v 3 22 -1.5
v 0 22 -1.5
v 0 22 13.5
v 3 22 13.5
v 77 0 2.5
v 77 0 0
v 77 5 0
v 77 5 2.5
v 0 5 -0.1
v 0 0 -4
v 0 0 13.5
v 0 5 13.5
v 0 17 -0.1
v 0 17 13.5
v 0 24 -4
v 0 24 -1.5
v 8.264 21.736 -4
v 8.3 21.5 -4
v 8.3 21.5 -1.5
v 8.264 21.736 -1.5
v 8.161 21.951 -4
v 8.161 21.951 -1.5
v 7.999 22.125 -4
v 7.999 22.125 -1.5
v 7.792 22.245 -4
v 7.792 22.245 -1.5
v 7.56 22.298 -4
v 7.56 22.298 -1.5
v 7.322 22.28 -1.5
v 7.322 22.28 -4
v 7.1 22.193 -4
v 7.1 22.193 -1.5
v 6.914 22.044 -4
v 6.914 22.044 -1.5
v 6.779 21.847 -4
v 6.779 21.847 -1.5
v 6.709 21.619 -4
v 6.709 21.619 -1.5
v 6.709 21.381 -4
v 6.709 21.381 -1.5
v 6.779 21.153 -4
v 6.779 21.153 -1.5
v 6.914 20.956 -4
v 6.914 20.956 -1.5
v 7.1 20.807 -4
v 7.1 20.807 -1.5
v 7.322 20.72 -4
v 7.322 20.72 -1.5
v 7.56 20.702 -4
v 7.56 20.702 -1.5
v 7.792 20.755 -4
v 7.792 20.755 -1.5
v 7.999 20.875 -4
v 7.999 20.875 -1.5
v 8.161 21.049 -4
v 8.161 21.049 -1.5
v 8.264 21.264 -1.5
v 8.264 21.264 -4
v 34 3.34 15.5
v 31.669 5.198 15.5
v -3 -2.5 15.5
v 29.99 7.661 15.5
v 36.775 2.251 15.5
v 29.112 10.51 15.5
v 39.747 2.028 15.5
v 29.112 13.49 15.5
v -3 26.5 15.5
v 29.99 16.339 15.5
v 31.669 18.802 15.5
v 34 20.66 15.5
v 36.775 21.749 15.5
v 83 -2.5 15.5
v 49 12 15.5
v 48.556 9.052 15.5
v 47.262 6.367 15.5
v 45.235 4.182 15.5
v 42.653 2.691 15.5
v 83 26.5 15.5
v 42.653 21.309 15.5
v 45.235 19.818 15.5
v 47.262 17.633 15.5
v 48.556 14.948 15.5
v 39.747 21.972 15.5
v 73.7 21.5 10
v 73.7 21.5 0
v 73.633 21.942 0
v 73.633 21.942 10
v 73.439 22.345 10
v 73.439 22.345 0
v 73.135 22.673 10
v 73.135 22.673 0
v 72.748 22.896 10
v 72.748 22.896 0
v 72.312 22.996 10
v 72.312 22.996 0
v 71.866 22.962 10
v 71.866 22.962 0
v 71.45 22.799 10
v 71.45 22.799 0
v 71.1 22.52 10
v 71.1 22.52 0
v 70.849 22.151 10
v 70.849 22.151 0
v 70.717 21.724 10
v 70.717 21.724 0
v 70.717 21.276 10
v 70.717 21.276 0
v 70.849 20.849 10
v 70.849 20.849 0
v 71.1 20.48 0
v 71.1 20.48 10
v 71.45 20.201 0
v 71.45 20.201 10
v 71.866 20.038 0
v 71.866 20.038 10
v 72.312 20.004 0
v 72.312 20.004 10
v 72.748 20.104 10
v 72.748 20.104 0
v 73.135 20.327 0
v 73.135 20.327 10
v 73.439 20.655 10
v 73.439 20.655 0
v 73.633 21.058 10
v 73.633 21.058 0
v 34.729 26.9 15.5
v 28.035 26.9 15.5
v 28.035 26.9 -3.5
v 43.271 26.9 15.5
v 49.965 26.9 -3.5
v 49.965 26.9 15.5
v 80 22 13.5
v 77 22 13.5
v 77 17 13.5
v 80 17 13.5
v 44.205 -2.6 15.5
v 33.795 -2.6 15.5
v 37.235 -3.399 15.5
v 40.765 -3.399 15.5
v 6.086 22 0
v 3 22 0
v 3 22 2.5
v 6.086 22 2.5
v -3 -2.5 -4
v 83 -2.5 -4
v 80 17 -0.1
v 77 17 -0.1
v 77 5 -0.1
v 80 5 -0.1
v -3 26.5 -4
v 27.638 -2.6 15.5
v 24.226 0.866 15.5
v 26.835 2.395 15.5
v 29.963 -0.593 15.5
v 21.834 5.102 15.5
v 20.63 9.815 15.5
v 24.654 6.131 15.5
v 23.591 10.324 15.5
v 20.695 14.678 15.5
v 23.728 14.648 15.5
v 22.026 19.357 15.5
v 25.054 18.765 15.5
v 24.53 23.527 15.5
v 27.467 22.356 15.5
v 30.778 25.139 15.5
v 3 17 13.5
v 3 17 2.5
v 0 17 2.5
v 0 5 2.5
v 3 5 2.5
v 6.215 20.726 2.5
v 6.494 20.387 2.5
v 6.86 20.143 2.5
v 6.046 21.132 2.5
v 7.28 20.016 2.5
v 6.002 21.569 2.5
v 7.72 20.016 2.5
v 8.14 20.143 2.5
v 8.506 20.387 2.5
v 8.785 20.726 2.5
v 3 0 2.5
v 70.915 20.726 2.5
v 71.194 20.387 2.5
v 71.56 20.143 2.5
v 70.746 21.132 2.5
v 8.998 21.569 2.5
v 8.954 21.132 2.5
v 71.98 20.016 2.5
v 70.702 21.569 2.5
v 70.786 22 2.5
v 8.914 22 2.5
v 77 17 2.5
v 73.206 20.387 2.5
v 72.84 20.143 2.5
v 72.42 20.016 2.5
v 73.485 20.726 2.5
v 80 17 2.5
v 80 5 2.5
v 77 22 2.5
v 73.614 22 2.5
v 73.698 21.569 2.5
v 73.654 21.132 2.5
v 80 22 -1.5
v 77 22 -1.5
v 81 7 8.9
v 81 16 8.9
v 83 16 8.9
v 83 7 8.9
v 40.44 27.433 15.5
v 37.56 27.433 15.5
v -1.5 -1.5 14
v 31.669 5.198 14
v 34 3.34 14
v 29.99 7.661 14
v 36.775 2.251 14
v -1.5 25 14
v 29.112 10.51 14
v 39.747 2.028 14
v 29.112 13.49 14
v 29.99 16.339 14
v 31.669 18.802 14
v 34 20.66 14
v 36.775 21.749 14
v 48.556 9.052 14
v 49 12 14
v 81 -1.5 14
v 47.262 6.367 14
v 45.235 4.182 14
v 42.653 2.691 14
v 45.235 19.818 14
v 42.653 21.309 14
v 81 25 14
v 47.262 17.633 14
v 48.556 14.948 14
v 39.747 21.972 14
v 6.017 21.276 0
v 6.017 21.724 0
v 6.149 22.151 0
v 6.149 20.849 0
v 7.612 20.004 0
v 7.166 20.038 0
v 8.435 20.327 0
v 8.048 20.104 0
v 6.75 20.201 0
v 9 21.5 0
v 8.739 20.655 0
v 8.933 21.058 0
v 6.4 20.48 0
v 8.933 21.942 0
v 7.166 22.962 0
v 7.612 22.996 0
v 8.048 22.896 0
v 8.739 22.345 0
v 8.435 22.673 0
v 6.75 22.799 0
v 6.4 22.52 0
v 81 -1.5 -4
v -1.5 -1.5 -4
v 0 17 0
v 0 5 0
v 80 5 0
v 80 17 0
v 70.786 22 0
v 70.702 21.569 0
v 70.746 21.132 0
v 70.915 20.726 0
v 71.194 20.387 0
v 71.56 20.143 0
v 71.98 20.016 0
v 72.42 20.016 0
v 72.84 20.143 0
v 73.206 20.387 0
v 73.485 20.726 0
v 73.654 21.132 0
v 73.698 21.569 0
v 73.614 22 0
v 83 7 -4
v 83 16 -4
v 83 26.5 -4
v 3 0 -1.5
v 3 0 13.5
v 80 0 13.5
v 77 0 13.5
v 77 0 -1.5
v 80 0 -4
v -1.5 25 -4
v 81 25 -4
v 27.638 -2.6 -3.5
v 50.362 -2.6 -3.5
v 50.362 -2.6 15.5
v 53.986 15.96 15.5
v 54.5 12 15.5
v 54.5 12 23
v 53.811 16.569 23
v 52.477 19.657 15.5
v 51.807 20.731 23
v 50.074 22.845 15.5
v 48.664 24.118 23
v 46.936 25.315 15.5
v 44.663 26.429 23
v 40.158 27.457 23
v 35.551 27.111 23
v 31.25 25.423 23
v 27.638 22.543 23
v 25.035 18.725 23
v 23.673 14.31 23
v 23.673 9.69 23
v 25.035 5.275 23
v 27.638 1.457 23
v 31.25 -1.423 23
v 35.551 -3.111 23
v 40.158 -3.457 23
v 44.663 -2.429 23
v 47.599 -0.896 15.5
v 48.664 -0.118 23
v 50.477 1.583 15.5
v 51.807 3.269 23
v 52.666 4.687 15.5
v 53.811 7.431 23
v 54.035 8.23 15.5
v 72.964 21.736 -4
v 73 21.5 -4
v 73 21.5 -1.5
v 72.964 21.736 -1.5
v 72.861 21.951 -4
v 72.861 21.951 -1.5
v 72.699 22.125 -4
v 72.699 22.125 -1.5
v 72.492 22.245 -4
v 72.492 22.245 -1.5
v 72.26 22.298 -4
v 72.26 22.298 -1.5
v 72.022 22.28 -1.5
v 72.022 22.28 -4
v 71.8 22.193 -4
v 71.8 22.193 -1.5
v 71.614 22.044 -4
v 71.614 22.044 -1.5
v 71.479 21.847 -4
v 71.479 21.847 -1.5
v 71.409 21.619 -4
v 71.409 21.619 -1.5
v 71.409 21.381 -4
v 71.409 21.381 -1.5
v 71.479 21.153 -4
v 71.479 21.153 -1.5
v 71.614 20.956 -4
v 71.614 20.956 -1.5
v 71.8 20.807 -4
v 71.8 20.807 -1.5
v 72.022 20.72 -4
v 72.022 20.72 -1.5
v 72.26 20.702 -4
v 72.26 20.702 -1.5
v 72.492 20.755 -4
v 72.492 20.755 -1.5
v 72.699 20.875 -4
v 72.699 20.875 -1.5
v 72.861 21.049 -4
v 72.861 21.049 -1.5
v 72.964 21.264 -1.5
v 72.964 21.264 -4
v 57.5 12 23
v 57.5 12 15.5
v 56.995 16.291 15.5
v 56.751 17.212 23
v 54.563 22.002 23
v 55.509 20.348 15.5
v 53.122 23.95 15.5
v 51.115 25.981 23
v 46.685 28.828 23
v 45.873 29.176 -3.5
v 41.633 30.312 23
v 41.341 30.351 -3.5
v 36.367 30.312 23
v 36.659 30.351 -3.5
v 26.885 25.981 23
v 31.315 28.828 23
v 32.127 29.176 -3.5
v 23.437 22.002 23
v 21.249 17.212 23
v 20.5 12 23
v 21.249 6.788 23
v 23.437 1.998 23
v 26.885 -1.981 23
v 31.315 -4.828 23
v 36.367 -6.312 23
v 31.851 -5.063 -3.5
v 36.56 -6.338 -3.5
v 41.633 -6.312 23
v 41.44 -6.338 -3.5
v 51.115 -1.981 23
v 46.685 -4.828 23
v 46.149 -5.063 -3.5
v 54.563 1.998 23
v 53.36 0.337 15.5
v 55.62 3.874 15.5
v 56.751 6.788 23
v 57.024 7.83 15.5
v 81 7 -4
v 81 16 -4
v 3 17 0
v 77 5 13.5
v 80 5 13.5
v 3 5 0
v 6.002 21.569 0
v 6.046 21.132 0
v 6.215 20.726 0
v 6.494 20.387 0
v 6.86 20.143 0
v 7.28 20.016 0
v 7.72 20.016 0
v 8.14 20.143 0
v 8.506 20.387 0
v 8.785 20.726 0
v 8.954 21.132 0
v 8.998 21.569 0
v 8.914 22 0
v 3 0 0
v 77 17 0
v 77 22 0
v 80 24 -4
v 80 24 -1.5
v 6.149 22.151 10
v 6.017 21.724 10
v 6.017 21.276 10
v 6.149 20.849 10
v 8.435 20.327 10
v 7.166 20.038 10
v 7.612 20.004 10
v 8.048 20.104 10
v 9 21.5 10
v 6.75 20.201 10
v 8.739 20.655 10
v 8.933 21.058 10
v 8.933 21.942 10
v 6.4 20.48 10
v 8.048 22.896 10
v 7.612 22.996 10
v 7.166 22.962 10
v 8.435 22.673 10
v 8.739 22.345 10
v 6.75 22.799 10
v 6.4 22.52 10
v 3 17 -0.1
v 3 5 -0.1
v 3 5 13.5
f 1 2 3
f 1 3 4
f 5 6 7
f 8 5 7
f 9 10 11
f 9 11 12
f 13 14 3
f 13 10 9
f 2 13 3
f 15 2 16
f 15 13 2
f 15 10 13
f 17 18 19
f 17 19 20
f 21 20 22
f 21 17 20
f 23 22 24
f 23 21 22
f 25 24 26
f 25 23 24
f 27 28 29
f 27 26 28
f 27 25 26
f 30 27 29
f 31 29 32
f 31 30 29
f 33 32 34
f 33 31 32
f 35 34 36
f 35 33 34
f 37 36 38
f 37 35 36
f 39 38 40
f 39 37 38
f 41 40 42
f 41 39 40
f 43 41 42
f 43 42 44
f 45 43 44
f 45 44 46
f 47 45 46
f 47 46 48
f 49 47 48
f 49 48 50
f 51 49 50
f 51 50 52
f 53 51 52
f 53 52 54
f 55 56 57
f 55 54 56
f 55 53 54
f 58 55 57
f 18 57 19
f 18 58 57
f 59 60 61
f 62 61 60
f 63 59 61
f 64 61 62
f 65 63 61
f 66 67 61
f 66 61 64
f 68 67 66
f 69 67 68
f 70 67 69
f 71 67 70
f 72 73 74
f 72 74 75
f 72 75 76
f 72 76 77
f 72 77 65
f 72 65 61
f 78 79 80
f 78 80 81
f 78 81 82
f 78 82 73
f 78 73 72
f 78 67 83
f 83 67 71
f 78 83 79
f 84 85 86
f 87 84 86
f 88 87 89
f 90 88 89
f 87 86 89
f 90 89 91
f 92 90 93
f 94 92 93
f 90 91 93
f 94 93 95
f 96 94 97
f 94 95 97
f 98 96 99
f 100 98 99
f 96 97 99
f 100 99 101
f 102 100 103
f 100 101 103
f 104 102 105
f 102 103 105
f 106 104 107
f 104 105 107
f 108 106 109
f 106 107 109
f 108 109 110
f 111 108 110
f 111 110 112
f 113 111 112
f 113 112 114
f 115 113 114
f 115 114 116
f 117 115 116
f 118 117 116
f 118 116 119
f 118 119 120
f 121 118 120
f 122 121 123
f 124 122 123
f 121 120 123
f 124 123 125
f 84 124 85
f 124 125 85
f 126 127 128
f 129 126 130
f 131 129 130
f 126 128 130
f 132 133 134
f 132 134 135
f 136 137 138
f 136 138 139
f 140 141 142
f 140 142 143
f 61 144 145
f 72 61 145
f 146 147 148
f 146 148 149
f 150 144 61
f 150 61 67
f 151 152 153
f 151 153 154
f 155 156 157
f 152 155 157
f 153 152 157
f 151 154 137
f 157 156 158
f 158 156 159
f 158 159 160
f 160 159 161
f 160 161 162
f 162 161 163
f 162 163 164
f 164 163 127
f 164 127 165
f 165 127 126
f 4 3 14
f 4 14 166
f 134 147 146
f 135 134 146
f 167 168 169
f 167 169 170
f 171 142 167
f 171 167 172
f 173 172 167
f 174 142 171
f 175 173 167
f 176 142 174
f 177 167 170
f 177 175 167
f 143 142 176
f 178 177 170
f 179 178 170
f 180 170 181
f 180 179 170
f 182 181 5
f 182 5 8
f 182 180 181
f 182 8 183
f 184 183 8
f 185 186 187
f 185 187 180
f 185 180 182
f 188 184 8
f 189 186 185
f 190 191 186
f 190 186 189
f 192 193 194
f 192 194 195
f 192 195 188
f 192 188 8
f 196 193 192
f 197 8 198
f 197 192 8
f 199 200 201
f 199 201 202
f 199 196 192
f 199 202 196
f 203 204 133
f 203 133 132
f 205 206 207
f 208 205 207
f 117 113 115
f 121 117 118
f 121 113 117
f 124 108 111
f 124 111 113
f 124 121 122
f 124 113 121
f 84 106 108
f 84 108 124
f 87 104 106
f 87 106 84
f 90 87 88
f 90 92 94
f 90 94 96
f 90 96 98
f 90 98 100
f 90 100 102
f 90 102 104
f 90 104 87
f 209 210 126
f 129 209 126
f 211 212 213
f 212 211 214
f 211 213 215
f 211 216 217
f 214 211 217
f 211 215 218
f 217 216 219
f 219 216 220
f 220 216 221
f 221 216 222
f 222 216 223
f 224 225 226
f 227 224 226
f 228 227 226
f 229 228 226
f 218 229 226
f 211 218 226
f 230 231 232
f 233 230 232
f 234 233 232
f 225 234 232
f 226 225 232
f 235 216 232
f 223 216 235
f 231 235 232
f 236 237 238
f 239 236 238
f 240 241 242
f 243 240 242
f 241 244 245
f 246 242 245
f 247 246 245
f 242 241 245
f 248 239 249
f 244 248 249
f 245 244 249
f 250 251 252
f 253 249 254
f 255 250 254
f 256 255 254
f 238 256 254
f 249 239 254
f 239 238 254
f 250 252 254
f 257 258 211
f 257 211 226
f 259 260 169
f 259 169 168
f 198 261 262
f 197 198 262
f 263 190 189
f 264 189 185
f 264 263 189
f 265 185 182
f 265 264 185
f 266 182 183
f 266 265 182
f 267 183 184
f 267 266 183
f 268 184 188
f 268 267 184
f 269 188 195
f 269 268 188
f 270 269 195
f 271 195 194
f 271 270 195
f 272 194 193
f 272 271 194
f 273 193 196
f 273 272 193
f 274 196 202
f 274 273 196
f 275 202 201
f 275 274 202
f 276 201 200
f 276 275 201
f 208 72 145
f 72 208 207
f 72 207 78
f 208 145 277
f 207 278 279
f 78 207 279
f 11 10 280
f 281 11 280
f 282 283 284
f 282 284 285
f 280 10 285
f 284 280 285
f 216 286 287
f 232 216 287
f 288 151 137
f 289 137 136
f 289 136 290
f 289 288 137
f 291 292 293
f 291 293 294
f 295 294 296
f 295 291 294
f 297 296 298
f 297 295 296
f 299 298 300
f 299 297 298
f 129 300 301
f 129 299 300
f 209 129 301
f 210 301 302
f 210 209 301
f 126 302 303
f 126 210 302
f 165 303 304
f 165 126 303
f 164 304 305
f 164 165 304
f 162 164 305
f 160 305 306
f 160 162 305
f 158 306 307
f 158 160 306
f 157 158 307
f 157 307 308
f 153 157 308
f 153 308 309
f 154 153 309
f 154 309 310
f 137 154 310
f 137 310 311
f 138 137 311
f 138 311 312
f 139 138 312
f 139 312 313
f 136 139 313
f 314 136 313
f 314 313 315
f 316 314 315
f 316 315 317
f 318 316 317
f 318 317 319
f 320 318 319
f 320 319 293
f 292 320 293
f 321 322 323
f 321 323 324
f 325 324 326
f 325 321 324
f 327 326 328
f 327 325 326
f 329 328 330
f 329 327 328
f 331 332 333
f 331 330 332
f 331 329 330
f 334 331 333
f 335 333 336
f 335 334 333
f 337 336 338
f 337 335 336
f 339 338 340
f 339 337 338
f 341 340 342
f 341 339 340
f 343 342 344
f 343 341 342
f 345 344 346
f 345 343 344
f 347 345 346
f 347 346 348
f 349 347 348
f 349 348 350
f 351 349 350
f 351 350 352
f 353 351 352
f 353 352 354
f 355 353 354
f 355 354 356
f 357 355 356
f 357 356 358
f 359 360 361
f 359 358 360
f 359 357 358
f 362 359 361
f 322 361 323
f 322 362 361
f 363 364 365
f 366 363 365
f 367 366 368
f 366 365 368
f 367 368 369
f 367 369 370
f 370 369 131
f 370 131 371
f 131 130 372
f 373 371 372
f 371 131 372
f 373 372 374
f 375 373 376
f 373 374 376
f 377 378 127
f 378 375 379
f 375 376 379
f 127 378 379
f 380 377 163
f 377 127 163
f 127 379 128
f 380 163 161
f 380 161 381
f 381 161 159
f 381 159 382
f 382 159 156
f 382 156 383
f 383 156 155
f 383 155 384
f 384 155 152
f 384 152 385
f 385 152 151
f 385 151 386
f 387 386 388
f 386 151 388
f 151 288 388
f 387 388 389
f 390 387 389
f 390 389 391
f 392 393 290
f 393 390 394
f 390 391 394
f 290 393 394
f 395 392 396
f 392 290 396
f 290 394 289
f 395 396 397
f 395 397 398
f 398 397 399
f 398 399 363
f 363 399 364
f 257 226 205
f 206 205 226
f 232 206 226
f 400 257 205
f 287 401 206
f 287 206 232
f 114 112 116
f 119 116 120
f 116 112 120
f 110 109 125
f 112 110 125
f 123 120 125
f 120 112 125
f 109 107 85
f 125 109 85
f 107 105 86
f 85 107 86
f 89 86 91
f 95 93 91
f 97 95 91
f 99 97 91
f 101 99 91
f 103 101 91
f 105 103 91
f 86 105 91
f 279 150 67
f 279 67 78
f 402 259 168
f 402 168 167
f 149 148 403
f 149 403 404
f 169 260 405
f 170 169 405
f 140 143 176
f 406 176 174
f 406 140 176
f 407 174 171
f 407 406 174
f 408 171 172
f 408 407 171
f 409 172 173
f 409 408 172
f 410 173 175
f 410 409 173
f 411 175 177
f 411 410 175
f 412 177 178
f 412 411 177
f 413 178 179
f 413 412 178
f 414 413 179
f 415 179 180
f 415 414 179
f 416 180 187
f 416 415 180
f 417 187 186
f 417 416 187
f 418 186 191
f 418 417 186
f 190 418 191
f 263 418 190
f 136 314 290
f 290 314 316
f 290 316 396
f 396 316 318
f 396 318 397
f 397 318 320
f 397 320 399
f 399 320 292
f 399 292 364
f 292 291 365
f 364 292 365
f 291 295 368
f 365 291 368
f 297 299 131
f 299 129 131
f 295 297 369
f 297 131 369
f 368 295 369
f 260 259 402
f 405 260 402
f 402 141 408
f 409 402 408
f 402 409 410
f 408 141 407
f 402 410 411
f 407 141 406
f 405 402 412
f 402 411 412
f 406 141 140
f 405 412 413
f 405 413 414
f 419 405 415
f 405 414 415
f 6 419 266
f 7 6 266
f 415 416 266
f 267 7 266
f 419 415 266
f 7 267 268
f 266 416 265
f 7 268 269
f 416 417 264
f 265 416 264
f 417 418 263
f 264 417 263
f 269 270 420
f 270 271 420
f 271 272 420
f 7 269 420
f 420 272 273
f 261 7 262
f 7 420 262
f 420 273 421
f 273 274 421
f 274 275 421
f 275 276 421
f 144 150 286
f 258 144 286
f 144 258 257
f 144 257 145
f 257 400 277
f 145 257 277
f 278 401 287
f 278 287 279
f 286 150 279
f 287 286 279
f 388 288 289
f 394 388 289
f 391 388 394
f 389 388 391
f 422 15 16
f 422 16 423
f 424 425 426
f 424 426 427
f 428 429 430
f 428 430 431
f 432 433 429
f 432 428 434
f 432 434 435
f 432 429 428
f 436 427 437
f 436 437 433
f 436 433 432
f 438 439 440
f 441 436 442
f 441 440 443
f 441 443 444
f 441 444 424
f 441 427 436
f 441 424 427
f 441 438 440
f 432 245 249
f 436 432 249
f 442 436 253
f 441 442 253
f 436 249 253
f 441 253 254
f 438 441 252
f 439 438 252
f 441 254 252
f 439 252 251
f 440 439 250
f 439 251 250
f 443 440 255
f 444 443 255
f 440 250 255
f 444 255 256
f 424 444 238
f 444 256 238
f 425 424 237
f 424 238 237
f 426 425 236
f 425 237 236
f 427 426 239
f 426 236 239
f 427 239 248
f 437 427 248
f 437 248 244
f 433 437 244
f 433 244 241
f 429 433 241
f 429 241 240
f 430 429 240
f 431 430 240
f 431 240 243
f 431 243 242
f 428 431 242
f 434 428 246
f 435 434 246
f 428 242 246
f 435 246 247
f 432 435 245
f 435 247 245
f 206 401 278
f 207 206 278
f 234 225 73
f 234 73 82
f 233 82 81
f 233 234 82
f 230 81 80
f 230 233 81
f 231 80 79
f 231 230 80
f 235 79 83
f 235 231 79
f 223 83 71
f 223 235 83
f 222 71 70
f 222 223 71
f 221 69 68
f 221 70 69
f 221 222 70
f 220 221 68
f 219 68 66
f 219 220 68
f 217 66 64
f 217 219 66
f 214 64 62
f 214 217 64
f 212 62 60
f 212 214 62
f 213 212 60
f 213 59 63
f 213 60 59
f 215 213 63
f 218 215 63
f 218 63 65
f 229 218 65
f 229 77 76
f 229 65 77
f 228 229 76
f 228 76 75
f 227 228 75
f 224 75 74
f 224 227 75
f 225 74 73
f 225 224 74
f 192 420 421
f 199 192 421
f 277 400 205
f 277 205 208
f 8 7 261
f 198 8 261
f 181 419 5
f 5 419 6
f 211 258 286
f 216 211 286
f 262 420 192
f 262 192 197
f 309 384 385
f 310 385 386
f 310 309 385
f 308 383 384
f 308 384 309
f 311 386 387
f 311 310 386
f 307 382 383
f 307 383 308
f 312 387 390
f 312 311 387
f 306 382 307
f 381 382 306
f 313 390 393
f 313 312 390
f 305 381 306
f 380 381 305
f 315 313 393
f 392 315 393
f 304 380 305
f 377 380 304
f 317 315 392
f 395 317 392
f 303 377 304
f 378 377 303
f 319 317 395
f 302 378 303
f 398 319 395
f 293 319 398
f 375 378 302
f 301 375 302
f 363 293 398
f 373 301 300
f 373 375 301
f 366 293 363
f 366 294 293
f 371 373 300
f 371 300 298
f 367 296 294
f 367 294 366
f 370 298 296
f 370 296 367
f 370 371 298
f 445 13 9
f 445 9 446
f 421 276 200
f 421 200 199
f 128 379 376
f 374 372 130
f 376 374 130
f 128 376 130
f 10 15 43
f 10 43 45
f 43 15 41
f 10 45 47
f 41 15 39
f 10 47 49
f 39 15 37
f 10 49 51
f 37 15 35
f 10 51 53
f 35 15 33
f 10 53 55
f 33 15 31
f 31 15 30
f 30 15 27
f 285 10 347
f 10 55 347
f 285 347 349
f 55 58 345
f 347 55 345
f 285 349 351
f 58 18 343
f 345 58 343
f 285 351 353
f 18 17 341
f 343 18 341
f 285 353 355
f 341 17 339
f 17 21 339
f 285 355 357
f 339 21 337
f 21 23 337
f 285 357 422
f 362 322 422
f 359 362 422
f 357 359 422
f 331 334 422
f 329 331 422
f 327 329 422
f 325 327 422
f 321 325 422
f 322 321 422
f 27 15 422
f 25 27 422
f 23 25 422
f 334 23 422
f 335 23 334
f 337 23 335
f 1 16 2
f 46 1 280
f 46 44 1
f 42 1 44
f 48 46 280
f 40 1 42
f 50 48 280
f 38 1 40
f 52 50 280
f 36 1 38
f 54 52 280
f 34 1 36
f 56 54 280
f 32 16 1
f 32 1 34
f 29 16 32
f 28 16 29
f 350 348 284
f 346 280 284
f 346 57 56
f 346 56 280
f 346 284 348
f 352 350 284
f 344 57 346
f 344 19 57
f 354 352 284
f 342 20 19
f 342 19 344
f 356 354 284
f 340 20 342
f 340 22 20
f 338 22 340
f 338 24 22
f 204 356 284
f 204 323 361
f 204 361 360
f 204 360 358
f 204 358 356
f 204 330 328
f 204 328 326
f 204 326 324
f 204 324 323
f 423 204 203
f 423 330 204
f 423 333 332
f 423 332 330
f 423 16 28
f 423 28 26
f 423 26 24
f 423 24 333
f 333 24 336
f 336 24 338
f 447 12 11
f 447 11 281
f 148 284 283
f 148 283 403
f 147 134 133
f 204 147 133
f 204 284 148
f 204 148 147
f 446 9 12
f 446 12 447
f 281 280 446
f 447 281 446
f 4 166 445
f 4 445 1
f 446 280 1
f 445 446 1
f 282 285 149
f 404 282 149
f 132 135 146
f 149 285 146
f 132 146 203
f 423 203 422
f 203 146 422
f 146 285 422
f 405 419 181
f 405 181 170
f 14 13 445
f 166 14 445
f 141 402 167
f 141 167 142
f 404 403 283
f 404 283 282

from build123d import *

# Parameters (mm, degrees)
CYLINDER_R        = 1.5
CYLINDER_DEPTH    = 10
BOX004_W          = 3
BOX004_H          = 5
BOX004_DEPTH      = 10
BOX003_W          = 3
BOX003_H          = 5
BOX003_DEPTH      = 10
BOX002_W          = 3
BOX002_H          = 5
BOX002_DEPTH      = 10
BOX001_W          = 3
BOX001_H          = 5
BOX001_DEPTH      = 10
CYLINDER001_R     = 1.5
CYLINDER001_DEPTH = 10
BOX_W             = 80
BOX_H             = 22
BOX_DEPTH         = 2.5
CYLINDER002_R     = 1.5
CYLINDER002_DEPTH = 10
CYLINDER003_R     = 1.5
CYLINDER003_DEPTH = 10
CYLINDER007_R     = 10
CYLINDER007_DEPTH = 24
BOX016_W          = 82.5
BOX016_H          = 26.5
BOX016_DEPTH      = 18
BOX017_W          = 8
BOX017_H          = 9
BOX017_DEPTH      = 13
BOX015_W          = 86
BOX015_H          = 29
BOX015_DEPTH      = 19.5
BOX018_W          = 86
BOX018_H          = 29.5
BOX018_DEPTH      = 19.5
CYLINDER008_R     = 10
CYLINDER008_DEPTH = 24
CYLINDER004_R     = 10
CYLINDER004_DEPTH = 24
BOX013_W          = 82.5
BOX013_H          = 26.5
BOX013_DEPTH      = 18
BOX014_W          = 8
BOX014_H          = 9
BOX014_DEPTH      = 13
BOX012_W          = 86
BOX012_H          = 29
BOX012_DEPTH      = 19.5
CYLINDER005_R     = 15.5
CYLINDER005_DEPTH = 7.5
CYLINDER006_R     = 18.5
CYLINDER006_DEPTH = 26.5
CYLINDER009_R     = 0.8
CYLINDER009_DEPTH = 10
CYLINDER010_R     = 0.8
CYLINDER010_DEPTH = 10
BOX010_W          = 3
BOX010_H          = 12
BOX010_DEPTH      = 2
BOX008_W          = 3
BOX008_H          = 5
BOX008_DEPTH      = 15.5
BOX007_W          = 3
BOX007_H          = 5
BOX007_DEPTH      = 15.5
BOX006_W          = 3
BOX006_H          = 5
BOX006_DEPTH      = 15.5
BOX005_W          = 3
BOX005_H          = 5
BOX005_DEPTH      = 15.5
BOX011_W          = 3
BOX011_H          = 12
BOX011_DEPTH      = 2
BOX009_W          = 80
BOX009_H          = 24
BOX009_DEPTH      = 2.5


with BuildPart() as cylinder:
    # Cylinder → Cylinder (new body)
    with BuildSketch(Plane(origin=(7.5, 21.5, 0), x_dir=(1, 0, 0), z_dir=(0, 0, 1))):
        Circle(CYLINDER_R)
    extrude(amount=CYLINDER_DEPTH)


with BuildPart() as cube003:
    # Box004 → Box004 (new body)
    with BuildSketch(Plane(origin=(0, 17, 0), x_dir=(1, 0, 0), z_dir=(0, 0, 1))):
        with Locations((1.5, 2.5)):
            Rectangle(BOX004_W, BOX004_H)
    extrude(amount=BOX004_DEPTH)


with BuildPart() as cube002:
    # Box003 → Box003 (new body)
    with BuildSketch(Plane(origin=(77, 17, 0), x_dir=(1, 0, 0), z_dir=(0, 0, 1))):
        with Locations((1.5, 2.5)):
            Rectangle(BOX003_W, BOX003_H)
    extrude(amount=BOX003_DEPTH)


with BuildPart() as cube001:
    # Box002 → Box002 (new body)
    with BuildSketch(Plane(origin=(77, 0, 0), x_dir=(1, 0, 0), z_dir=(0, 0, 1))):
        with Locations((1.5, 2.5)):
            Rectangle(BOX002_W, BOX002_H)
    extrude(amount=BOX002_DEPTH)


with BuildPart() as cube:
    # Box001 → Box001 (new body)
    with BuildSketch(Plane.XY):
        with Locations((1.5, 2.5)):
            Rectangle(BOX001_W, BOX001_H)
    extrude(amount=BOX001_DEPTH)


with BuildPart() as fusion:
    # Cylinder001 → Cylinder001 (new body)
    with BuildSketch(Plane(origin=(72.2, 21.5, 0), x_dir=(1, 0, 0), z_dir=(0, 0, 1))):
        Circle(CYLINDER001_R)
    extrude(amount=CYLINDER001_DEPTH)

    # Fusion: union Cylinder, Cube003, Cube002, Cube001, Cube
    add(cylinder.part)
    add(cube003.part)
    add(cube002.part)
    add(cube001.part)
    add(cube.part)


with BuildPart() as simple_pci_board:
    # Box → Box (new body)
    with BuildSketch(Plane.XY):
        with Locations((40, 11)):
            Rectangle(BOX_W, BOX_H)
    extrude(amount=BOX_DEPTH)

    # Cut: cut Fusion
    add(fusion.part, mode=Mode.SUBTRACT)


with BuildPart() as cylinder002:
    # Cylinder002 → Cylinder002 (new body)
    with BuildSketch(Plane(origin=(72.2, 21.5, 0), x_dir=(1, 0, 0), z_dir=(0, 0, 1))):
        Circle(CYLINDER002_R)
    extrude(amount=CYLINDER002_DEPTH)


with BuildPart() as cylinder003:
    # Cylinder003 → Cylinder003 (new body)
    with BuildSketch(Plane(origin=(7.5, 21.5, 0), x_dir=(1, 0, 0), z_dir=(0, 0, 1))):
        Circle(CYLINDER003_R)
    extrude(amount=CYLINDER003_DEPTH)


with BuildPart() as cylinder007:
    # Cylinder007 → Cylinder007 (new body)
    with BuildSketch(Plane(origin=(39, 12, 9), x_dir=(1, 0, 0), z_dir=(0, 0, 1))):
        Circle(CYLINDER007_R)
    extrude(amount=CYLINDER007_DEPTH)


with BuildPart() as pre_pci_board005:
    # Box016 → Box016 (new body)
    with BuildSketch(Plane(origin=(-1.5, -1.5, -4), x_dir=(1, 0, 0), z_dir=(0, 0, 1))):
        with Locations((41.25, 13.25)):
            Rectangle(BOX016_W, BOX016_H)
    extrude(amount=BOX016_DEPTH)


with BuildPart() as fusion003:
    # Box017 → Box017 (new body)
    with BuildSketch(Plane(origin=(77, 7, -4.1), x_dir=(1, 0, 0), z_dir=(0, 0, 1))):
        with Locations((4, 4.5)):
            Rectangle(BOX017_W, BOX017_H)
    extrude(amount=BOX017_DEPTH)

    # Fusion003: union Cylinder007, pre-pci-board005
    add(cylinder007.part)
    add(pre_pci_board005.part)


with BuildPart() as cut003:
    # Box015 → Box015 (new body)
    with BuildSketch(Plane(origin=(-3, -2.5, -4), x_dir=(1, 0, 0), z_dir=(0, 0, 1))):
        with Locations((43, 14.5)):
            Rectangle(BOX015_W, BOX015_H)
    extrude(amount=BOX015_DEPTH)

    # Cut003: cut Fusion003
    add(fusion003.part, mode=Mode.SUBTRACT)


with BuildPart() as pre_pci_board006:
    # Box018 → Box018 (new body)
    with BuildSketch(Plane(origin=(-3, -2.6, -4), x_dir=(1, 0, 0), z_dir=(0, 0, 1))):
        with Locations((43, 14.75)):
            Rectangle(BOX018_W, BOX018_H)
    extrude(amount=BOX018_DEPTH)


with BuildPart() as fusion004:
    # Cylinder008 → Cylinder008 (new body)
    with BuildSketch(Plane(origin=(39, 12, 9), x_dir=(1, 0, 0), z_dir=(0, 0, 1))):
        Circle(CYLINDER008_R)
    extrude(amount=CYLINDER008_DEPTH)

    # Fusion004: union pre-pci-board006
    add(pre_pci_board006.part)


with BuildPart() as cylinder004:
    # Cylinder004 → Cylinder004 (new body)
    with BuildSketch(Plane(origin=(39, 12, 9), x_dir=(1, 0, 0), z_dir=(0, 0, 1))):
        Circle(CYLINDER004_R)
    extrude(amount=CYLINDER004_DEPTH)


with BuildPart() as pre_pci_board003:
    # Box013 → Box013 (new body)
    with BuildSketch(Plane(origin=(-1.5, -1.5, -4), x_dir=(1, 0, 0), z_dir=(0, 0, 1))):
        with Locations((41.25, 13.25)):
            Rectangle(BOX013_W, BOX013_H)
    extrude(amount=BOX013_DEPTH)


with BuildPart() as fusion002:
    # Box014 → Box014 (new body)
    with BuildSketch(Plane(origin=(77, 7, -4.1), x_dir=(1, 0, 0), z_dir=(0, 0, 1))):
        with Locations((4, 4.5)):
            Rectangle(BOX014_W, BOX014_H)
    extrude(amount=BOX014_DEPTH)

    # Fusion002: union Cylinder004, pre-pci-board003
    add(cylinder004.part)
    add(pre_pci_board003.part)


with BuildPart() as cut001:
    # Box012 → Box012 (new body)
    with BuildSketch(Plane(origin=(-3, -2.5, -4), x_dir=(1, 0, 0), z_dir=(0, 0, 1))):
        with Locations((43, 14.5)):
            Rectangle(BOX012_W, BOX012_H)
    extrude(amount=BOX012_DEPTH)

    # Cut001: cut Fusion002
    add(fusion002.part, mode=Mode.SUBTRACT)


with BuildPart() as cylinder005:
    # Cylinder005 → Cylinder005 (new body)
    with BuildSketch(Plane(origin=(39, 12, 15.5), x_dir=(1, 0, 0), z_dir=(0, 0, 1))):
        Circle(CYLINDER005_R)
    extrude(amount=CYLINDER005_DEPTH)


with BuildPart() as cut005:
    # Cylinder006 → Cylinder006 (new body)
    with BuildSketch(Plane(origin=(39, 12, -3.5), x_dir=(1, 0, 0), z_dir=(0, 0, 1))):
        Circle(CYLINDER006_R)
    extrude(amount=CYLINDER006_DEPTH)

    # Cut002: cut Cylinder005
    add(cylinder005.part, mode=Mode.SUBTRACT)

    # Cut004: cut Cut001
    add(cut001.part, mode=Mode.SUBTRACT)

    # Cut005: cut Fusion004
    add(fusion004.part, mode=Mode.SUBTRACT)


with BuildPart() as cylinder009:
    # Cylinder009 → Cylinder009 (new body)
    with BuildSketch(Plane(origin=(72.2, 21.5, 0), x_dir=(1, 0, 0), z_dir=(0, 0, 1))):
        Circle(CYLINDER009_R)
    extrude(amount=CYLINDER009_DEPTH)


with BuildPart() as fusion006:
    # Cylinder010 → Cylinder010 (new body)
    with BuildSketch(Plane(origin=(7.5, 21.5, 0), x_dir=(1, 0, 0), z_dir=(0, 0, 1))):
        Circle(CYLINDER010_R)
    extrude(amount=CYLINDER010_DEPTH)

    # Fusion006: union Cylinder009
    add(cylinder009.part)


with BuildPart() as fusion006_1:
    # Fusion006 placement: moved
    add(fusion006.part.moved(Location((0, 0, -6))))


with BuildPart() as cube008:
    # Box010 → Box010 (new body)
    with BuildSketch(Plane(origin=(0, 5, -2.1), x_dir=(1, 0, 0), z_dir=(0, 0, 1))):
        with Locations((1.5, 6)):
            Rectangle(BOX010_W, BOX010_H)
    extrude(amount=BOX010_DEPTH)


with BuildPart() as cube007:
    # Box008 → Box008 (new body)
    with BuildSketch(Plane.XY.offset(-2)):
        with Locations((1.5, 2.5)):
            Rectangle(BOX008_W, BOX008_H)
    extrude(amount=BOX008_DEPTH)


with BuildPart() as cube006:
    # Box007 → Box007 (new body)
    with BuildSketch(Plane(origin=(77, 0, -2), x_dir=(1, 0, 0), z_dir=(0, 0, 1))):
        with Locations((1.5, 2.5)):
            Rectangle(BOX007_W, BOX007_H)
    extrude(amount=BOX007_DEPTH)


with BuildPart() as cube005:
    # Box006 → Box006 (new body)
    with BuildSketch(Plane(origin=(77, 17, -2), x_dir=(1, 0, 0), z_dir=(0, 0, 1))):
        with Locations((1.5, 2.5)):
            Rectangle(BOX006_W, BOX006_H)
    extrude(amount=BOX006_DEPTH)


with BuildPart() as cube004:
    # Box005 → Box005 (new body)
    with BuildSketch(Plane(origin=(0, 17, -2), x_dir=(1, 0, 0), z_dir=(0, 0, 1))):
        with Locations((1.5, 2.5)):
            Rectangle(BOX005_W, BOX005_H)
    extrude(amount=BOX005_DEPTH)


with BuildPart() as fusion001:
    # Box011 → Box011 (new body)
    with BuildSketch(Plane(origin=(77, 5, -2.1), x_dir=(1, 0, 0), z_dir=(0, 0, 1))):
        with Locations((1.5, 6)):
            Rectangle(BOX011_W, BOX011_H)
    extrude(amount=BOX011_DEPTH)

    # Fusion001: union Cube008, Cube007, Cube006, Cube005, Cube004
    add(cube008.part)
    add(cube007.part)
    add(cube006.part)
    add(cube005.part)
    add(cube004.part)


with BuildPart() as cut006:
    # Box009 → Box009 (new body)
    with BuildSketch(Plane.XY.offset(-4)):
        with Locations((40, 12)):
            Rectangle(BOX009_W, BOX009_H)
    extrude(amount=BOX009_DEPTH)

    # Fusion005: union Fusion001
    add(fusion001.part)

    # Cut006: cut Fusion006
    add(fusion006_1.part, mode=Mode.SUBTRACT)


solid = Compound([simple_pci_board.part, cylinder002.part, cylinder003.part, cut003.part, cut005.part, cut006.part])
